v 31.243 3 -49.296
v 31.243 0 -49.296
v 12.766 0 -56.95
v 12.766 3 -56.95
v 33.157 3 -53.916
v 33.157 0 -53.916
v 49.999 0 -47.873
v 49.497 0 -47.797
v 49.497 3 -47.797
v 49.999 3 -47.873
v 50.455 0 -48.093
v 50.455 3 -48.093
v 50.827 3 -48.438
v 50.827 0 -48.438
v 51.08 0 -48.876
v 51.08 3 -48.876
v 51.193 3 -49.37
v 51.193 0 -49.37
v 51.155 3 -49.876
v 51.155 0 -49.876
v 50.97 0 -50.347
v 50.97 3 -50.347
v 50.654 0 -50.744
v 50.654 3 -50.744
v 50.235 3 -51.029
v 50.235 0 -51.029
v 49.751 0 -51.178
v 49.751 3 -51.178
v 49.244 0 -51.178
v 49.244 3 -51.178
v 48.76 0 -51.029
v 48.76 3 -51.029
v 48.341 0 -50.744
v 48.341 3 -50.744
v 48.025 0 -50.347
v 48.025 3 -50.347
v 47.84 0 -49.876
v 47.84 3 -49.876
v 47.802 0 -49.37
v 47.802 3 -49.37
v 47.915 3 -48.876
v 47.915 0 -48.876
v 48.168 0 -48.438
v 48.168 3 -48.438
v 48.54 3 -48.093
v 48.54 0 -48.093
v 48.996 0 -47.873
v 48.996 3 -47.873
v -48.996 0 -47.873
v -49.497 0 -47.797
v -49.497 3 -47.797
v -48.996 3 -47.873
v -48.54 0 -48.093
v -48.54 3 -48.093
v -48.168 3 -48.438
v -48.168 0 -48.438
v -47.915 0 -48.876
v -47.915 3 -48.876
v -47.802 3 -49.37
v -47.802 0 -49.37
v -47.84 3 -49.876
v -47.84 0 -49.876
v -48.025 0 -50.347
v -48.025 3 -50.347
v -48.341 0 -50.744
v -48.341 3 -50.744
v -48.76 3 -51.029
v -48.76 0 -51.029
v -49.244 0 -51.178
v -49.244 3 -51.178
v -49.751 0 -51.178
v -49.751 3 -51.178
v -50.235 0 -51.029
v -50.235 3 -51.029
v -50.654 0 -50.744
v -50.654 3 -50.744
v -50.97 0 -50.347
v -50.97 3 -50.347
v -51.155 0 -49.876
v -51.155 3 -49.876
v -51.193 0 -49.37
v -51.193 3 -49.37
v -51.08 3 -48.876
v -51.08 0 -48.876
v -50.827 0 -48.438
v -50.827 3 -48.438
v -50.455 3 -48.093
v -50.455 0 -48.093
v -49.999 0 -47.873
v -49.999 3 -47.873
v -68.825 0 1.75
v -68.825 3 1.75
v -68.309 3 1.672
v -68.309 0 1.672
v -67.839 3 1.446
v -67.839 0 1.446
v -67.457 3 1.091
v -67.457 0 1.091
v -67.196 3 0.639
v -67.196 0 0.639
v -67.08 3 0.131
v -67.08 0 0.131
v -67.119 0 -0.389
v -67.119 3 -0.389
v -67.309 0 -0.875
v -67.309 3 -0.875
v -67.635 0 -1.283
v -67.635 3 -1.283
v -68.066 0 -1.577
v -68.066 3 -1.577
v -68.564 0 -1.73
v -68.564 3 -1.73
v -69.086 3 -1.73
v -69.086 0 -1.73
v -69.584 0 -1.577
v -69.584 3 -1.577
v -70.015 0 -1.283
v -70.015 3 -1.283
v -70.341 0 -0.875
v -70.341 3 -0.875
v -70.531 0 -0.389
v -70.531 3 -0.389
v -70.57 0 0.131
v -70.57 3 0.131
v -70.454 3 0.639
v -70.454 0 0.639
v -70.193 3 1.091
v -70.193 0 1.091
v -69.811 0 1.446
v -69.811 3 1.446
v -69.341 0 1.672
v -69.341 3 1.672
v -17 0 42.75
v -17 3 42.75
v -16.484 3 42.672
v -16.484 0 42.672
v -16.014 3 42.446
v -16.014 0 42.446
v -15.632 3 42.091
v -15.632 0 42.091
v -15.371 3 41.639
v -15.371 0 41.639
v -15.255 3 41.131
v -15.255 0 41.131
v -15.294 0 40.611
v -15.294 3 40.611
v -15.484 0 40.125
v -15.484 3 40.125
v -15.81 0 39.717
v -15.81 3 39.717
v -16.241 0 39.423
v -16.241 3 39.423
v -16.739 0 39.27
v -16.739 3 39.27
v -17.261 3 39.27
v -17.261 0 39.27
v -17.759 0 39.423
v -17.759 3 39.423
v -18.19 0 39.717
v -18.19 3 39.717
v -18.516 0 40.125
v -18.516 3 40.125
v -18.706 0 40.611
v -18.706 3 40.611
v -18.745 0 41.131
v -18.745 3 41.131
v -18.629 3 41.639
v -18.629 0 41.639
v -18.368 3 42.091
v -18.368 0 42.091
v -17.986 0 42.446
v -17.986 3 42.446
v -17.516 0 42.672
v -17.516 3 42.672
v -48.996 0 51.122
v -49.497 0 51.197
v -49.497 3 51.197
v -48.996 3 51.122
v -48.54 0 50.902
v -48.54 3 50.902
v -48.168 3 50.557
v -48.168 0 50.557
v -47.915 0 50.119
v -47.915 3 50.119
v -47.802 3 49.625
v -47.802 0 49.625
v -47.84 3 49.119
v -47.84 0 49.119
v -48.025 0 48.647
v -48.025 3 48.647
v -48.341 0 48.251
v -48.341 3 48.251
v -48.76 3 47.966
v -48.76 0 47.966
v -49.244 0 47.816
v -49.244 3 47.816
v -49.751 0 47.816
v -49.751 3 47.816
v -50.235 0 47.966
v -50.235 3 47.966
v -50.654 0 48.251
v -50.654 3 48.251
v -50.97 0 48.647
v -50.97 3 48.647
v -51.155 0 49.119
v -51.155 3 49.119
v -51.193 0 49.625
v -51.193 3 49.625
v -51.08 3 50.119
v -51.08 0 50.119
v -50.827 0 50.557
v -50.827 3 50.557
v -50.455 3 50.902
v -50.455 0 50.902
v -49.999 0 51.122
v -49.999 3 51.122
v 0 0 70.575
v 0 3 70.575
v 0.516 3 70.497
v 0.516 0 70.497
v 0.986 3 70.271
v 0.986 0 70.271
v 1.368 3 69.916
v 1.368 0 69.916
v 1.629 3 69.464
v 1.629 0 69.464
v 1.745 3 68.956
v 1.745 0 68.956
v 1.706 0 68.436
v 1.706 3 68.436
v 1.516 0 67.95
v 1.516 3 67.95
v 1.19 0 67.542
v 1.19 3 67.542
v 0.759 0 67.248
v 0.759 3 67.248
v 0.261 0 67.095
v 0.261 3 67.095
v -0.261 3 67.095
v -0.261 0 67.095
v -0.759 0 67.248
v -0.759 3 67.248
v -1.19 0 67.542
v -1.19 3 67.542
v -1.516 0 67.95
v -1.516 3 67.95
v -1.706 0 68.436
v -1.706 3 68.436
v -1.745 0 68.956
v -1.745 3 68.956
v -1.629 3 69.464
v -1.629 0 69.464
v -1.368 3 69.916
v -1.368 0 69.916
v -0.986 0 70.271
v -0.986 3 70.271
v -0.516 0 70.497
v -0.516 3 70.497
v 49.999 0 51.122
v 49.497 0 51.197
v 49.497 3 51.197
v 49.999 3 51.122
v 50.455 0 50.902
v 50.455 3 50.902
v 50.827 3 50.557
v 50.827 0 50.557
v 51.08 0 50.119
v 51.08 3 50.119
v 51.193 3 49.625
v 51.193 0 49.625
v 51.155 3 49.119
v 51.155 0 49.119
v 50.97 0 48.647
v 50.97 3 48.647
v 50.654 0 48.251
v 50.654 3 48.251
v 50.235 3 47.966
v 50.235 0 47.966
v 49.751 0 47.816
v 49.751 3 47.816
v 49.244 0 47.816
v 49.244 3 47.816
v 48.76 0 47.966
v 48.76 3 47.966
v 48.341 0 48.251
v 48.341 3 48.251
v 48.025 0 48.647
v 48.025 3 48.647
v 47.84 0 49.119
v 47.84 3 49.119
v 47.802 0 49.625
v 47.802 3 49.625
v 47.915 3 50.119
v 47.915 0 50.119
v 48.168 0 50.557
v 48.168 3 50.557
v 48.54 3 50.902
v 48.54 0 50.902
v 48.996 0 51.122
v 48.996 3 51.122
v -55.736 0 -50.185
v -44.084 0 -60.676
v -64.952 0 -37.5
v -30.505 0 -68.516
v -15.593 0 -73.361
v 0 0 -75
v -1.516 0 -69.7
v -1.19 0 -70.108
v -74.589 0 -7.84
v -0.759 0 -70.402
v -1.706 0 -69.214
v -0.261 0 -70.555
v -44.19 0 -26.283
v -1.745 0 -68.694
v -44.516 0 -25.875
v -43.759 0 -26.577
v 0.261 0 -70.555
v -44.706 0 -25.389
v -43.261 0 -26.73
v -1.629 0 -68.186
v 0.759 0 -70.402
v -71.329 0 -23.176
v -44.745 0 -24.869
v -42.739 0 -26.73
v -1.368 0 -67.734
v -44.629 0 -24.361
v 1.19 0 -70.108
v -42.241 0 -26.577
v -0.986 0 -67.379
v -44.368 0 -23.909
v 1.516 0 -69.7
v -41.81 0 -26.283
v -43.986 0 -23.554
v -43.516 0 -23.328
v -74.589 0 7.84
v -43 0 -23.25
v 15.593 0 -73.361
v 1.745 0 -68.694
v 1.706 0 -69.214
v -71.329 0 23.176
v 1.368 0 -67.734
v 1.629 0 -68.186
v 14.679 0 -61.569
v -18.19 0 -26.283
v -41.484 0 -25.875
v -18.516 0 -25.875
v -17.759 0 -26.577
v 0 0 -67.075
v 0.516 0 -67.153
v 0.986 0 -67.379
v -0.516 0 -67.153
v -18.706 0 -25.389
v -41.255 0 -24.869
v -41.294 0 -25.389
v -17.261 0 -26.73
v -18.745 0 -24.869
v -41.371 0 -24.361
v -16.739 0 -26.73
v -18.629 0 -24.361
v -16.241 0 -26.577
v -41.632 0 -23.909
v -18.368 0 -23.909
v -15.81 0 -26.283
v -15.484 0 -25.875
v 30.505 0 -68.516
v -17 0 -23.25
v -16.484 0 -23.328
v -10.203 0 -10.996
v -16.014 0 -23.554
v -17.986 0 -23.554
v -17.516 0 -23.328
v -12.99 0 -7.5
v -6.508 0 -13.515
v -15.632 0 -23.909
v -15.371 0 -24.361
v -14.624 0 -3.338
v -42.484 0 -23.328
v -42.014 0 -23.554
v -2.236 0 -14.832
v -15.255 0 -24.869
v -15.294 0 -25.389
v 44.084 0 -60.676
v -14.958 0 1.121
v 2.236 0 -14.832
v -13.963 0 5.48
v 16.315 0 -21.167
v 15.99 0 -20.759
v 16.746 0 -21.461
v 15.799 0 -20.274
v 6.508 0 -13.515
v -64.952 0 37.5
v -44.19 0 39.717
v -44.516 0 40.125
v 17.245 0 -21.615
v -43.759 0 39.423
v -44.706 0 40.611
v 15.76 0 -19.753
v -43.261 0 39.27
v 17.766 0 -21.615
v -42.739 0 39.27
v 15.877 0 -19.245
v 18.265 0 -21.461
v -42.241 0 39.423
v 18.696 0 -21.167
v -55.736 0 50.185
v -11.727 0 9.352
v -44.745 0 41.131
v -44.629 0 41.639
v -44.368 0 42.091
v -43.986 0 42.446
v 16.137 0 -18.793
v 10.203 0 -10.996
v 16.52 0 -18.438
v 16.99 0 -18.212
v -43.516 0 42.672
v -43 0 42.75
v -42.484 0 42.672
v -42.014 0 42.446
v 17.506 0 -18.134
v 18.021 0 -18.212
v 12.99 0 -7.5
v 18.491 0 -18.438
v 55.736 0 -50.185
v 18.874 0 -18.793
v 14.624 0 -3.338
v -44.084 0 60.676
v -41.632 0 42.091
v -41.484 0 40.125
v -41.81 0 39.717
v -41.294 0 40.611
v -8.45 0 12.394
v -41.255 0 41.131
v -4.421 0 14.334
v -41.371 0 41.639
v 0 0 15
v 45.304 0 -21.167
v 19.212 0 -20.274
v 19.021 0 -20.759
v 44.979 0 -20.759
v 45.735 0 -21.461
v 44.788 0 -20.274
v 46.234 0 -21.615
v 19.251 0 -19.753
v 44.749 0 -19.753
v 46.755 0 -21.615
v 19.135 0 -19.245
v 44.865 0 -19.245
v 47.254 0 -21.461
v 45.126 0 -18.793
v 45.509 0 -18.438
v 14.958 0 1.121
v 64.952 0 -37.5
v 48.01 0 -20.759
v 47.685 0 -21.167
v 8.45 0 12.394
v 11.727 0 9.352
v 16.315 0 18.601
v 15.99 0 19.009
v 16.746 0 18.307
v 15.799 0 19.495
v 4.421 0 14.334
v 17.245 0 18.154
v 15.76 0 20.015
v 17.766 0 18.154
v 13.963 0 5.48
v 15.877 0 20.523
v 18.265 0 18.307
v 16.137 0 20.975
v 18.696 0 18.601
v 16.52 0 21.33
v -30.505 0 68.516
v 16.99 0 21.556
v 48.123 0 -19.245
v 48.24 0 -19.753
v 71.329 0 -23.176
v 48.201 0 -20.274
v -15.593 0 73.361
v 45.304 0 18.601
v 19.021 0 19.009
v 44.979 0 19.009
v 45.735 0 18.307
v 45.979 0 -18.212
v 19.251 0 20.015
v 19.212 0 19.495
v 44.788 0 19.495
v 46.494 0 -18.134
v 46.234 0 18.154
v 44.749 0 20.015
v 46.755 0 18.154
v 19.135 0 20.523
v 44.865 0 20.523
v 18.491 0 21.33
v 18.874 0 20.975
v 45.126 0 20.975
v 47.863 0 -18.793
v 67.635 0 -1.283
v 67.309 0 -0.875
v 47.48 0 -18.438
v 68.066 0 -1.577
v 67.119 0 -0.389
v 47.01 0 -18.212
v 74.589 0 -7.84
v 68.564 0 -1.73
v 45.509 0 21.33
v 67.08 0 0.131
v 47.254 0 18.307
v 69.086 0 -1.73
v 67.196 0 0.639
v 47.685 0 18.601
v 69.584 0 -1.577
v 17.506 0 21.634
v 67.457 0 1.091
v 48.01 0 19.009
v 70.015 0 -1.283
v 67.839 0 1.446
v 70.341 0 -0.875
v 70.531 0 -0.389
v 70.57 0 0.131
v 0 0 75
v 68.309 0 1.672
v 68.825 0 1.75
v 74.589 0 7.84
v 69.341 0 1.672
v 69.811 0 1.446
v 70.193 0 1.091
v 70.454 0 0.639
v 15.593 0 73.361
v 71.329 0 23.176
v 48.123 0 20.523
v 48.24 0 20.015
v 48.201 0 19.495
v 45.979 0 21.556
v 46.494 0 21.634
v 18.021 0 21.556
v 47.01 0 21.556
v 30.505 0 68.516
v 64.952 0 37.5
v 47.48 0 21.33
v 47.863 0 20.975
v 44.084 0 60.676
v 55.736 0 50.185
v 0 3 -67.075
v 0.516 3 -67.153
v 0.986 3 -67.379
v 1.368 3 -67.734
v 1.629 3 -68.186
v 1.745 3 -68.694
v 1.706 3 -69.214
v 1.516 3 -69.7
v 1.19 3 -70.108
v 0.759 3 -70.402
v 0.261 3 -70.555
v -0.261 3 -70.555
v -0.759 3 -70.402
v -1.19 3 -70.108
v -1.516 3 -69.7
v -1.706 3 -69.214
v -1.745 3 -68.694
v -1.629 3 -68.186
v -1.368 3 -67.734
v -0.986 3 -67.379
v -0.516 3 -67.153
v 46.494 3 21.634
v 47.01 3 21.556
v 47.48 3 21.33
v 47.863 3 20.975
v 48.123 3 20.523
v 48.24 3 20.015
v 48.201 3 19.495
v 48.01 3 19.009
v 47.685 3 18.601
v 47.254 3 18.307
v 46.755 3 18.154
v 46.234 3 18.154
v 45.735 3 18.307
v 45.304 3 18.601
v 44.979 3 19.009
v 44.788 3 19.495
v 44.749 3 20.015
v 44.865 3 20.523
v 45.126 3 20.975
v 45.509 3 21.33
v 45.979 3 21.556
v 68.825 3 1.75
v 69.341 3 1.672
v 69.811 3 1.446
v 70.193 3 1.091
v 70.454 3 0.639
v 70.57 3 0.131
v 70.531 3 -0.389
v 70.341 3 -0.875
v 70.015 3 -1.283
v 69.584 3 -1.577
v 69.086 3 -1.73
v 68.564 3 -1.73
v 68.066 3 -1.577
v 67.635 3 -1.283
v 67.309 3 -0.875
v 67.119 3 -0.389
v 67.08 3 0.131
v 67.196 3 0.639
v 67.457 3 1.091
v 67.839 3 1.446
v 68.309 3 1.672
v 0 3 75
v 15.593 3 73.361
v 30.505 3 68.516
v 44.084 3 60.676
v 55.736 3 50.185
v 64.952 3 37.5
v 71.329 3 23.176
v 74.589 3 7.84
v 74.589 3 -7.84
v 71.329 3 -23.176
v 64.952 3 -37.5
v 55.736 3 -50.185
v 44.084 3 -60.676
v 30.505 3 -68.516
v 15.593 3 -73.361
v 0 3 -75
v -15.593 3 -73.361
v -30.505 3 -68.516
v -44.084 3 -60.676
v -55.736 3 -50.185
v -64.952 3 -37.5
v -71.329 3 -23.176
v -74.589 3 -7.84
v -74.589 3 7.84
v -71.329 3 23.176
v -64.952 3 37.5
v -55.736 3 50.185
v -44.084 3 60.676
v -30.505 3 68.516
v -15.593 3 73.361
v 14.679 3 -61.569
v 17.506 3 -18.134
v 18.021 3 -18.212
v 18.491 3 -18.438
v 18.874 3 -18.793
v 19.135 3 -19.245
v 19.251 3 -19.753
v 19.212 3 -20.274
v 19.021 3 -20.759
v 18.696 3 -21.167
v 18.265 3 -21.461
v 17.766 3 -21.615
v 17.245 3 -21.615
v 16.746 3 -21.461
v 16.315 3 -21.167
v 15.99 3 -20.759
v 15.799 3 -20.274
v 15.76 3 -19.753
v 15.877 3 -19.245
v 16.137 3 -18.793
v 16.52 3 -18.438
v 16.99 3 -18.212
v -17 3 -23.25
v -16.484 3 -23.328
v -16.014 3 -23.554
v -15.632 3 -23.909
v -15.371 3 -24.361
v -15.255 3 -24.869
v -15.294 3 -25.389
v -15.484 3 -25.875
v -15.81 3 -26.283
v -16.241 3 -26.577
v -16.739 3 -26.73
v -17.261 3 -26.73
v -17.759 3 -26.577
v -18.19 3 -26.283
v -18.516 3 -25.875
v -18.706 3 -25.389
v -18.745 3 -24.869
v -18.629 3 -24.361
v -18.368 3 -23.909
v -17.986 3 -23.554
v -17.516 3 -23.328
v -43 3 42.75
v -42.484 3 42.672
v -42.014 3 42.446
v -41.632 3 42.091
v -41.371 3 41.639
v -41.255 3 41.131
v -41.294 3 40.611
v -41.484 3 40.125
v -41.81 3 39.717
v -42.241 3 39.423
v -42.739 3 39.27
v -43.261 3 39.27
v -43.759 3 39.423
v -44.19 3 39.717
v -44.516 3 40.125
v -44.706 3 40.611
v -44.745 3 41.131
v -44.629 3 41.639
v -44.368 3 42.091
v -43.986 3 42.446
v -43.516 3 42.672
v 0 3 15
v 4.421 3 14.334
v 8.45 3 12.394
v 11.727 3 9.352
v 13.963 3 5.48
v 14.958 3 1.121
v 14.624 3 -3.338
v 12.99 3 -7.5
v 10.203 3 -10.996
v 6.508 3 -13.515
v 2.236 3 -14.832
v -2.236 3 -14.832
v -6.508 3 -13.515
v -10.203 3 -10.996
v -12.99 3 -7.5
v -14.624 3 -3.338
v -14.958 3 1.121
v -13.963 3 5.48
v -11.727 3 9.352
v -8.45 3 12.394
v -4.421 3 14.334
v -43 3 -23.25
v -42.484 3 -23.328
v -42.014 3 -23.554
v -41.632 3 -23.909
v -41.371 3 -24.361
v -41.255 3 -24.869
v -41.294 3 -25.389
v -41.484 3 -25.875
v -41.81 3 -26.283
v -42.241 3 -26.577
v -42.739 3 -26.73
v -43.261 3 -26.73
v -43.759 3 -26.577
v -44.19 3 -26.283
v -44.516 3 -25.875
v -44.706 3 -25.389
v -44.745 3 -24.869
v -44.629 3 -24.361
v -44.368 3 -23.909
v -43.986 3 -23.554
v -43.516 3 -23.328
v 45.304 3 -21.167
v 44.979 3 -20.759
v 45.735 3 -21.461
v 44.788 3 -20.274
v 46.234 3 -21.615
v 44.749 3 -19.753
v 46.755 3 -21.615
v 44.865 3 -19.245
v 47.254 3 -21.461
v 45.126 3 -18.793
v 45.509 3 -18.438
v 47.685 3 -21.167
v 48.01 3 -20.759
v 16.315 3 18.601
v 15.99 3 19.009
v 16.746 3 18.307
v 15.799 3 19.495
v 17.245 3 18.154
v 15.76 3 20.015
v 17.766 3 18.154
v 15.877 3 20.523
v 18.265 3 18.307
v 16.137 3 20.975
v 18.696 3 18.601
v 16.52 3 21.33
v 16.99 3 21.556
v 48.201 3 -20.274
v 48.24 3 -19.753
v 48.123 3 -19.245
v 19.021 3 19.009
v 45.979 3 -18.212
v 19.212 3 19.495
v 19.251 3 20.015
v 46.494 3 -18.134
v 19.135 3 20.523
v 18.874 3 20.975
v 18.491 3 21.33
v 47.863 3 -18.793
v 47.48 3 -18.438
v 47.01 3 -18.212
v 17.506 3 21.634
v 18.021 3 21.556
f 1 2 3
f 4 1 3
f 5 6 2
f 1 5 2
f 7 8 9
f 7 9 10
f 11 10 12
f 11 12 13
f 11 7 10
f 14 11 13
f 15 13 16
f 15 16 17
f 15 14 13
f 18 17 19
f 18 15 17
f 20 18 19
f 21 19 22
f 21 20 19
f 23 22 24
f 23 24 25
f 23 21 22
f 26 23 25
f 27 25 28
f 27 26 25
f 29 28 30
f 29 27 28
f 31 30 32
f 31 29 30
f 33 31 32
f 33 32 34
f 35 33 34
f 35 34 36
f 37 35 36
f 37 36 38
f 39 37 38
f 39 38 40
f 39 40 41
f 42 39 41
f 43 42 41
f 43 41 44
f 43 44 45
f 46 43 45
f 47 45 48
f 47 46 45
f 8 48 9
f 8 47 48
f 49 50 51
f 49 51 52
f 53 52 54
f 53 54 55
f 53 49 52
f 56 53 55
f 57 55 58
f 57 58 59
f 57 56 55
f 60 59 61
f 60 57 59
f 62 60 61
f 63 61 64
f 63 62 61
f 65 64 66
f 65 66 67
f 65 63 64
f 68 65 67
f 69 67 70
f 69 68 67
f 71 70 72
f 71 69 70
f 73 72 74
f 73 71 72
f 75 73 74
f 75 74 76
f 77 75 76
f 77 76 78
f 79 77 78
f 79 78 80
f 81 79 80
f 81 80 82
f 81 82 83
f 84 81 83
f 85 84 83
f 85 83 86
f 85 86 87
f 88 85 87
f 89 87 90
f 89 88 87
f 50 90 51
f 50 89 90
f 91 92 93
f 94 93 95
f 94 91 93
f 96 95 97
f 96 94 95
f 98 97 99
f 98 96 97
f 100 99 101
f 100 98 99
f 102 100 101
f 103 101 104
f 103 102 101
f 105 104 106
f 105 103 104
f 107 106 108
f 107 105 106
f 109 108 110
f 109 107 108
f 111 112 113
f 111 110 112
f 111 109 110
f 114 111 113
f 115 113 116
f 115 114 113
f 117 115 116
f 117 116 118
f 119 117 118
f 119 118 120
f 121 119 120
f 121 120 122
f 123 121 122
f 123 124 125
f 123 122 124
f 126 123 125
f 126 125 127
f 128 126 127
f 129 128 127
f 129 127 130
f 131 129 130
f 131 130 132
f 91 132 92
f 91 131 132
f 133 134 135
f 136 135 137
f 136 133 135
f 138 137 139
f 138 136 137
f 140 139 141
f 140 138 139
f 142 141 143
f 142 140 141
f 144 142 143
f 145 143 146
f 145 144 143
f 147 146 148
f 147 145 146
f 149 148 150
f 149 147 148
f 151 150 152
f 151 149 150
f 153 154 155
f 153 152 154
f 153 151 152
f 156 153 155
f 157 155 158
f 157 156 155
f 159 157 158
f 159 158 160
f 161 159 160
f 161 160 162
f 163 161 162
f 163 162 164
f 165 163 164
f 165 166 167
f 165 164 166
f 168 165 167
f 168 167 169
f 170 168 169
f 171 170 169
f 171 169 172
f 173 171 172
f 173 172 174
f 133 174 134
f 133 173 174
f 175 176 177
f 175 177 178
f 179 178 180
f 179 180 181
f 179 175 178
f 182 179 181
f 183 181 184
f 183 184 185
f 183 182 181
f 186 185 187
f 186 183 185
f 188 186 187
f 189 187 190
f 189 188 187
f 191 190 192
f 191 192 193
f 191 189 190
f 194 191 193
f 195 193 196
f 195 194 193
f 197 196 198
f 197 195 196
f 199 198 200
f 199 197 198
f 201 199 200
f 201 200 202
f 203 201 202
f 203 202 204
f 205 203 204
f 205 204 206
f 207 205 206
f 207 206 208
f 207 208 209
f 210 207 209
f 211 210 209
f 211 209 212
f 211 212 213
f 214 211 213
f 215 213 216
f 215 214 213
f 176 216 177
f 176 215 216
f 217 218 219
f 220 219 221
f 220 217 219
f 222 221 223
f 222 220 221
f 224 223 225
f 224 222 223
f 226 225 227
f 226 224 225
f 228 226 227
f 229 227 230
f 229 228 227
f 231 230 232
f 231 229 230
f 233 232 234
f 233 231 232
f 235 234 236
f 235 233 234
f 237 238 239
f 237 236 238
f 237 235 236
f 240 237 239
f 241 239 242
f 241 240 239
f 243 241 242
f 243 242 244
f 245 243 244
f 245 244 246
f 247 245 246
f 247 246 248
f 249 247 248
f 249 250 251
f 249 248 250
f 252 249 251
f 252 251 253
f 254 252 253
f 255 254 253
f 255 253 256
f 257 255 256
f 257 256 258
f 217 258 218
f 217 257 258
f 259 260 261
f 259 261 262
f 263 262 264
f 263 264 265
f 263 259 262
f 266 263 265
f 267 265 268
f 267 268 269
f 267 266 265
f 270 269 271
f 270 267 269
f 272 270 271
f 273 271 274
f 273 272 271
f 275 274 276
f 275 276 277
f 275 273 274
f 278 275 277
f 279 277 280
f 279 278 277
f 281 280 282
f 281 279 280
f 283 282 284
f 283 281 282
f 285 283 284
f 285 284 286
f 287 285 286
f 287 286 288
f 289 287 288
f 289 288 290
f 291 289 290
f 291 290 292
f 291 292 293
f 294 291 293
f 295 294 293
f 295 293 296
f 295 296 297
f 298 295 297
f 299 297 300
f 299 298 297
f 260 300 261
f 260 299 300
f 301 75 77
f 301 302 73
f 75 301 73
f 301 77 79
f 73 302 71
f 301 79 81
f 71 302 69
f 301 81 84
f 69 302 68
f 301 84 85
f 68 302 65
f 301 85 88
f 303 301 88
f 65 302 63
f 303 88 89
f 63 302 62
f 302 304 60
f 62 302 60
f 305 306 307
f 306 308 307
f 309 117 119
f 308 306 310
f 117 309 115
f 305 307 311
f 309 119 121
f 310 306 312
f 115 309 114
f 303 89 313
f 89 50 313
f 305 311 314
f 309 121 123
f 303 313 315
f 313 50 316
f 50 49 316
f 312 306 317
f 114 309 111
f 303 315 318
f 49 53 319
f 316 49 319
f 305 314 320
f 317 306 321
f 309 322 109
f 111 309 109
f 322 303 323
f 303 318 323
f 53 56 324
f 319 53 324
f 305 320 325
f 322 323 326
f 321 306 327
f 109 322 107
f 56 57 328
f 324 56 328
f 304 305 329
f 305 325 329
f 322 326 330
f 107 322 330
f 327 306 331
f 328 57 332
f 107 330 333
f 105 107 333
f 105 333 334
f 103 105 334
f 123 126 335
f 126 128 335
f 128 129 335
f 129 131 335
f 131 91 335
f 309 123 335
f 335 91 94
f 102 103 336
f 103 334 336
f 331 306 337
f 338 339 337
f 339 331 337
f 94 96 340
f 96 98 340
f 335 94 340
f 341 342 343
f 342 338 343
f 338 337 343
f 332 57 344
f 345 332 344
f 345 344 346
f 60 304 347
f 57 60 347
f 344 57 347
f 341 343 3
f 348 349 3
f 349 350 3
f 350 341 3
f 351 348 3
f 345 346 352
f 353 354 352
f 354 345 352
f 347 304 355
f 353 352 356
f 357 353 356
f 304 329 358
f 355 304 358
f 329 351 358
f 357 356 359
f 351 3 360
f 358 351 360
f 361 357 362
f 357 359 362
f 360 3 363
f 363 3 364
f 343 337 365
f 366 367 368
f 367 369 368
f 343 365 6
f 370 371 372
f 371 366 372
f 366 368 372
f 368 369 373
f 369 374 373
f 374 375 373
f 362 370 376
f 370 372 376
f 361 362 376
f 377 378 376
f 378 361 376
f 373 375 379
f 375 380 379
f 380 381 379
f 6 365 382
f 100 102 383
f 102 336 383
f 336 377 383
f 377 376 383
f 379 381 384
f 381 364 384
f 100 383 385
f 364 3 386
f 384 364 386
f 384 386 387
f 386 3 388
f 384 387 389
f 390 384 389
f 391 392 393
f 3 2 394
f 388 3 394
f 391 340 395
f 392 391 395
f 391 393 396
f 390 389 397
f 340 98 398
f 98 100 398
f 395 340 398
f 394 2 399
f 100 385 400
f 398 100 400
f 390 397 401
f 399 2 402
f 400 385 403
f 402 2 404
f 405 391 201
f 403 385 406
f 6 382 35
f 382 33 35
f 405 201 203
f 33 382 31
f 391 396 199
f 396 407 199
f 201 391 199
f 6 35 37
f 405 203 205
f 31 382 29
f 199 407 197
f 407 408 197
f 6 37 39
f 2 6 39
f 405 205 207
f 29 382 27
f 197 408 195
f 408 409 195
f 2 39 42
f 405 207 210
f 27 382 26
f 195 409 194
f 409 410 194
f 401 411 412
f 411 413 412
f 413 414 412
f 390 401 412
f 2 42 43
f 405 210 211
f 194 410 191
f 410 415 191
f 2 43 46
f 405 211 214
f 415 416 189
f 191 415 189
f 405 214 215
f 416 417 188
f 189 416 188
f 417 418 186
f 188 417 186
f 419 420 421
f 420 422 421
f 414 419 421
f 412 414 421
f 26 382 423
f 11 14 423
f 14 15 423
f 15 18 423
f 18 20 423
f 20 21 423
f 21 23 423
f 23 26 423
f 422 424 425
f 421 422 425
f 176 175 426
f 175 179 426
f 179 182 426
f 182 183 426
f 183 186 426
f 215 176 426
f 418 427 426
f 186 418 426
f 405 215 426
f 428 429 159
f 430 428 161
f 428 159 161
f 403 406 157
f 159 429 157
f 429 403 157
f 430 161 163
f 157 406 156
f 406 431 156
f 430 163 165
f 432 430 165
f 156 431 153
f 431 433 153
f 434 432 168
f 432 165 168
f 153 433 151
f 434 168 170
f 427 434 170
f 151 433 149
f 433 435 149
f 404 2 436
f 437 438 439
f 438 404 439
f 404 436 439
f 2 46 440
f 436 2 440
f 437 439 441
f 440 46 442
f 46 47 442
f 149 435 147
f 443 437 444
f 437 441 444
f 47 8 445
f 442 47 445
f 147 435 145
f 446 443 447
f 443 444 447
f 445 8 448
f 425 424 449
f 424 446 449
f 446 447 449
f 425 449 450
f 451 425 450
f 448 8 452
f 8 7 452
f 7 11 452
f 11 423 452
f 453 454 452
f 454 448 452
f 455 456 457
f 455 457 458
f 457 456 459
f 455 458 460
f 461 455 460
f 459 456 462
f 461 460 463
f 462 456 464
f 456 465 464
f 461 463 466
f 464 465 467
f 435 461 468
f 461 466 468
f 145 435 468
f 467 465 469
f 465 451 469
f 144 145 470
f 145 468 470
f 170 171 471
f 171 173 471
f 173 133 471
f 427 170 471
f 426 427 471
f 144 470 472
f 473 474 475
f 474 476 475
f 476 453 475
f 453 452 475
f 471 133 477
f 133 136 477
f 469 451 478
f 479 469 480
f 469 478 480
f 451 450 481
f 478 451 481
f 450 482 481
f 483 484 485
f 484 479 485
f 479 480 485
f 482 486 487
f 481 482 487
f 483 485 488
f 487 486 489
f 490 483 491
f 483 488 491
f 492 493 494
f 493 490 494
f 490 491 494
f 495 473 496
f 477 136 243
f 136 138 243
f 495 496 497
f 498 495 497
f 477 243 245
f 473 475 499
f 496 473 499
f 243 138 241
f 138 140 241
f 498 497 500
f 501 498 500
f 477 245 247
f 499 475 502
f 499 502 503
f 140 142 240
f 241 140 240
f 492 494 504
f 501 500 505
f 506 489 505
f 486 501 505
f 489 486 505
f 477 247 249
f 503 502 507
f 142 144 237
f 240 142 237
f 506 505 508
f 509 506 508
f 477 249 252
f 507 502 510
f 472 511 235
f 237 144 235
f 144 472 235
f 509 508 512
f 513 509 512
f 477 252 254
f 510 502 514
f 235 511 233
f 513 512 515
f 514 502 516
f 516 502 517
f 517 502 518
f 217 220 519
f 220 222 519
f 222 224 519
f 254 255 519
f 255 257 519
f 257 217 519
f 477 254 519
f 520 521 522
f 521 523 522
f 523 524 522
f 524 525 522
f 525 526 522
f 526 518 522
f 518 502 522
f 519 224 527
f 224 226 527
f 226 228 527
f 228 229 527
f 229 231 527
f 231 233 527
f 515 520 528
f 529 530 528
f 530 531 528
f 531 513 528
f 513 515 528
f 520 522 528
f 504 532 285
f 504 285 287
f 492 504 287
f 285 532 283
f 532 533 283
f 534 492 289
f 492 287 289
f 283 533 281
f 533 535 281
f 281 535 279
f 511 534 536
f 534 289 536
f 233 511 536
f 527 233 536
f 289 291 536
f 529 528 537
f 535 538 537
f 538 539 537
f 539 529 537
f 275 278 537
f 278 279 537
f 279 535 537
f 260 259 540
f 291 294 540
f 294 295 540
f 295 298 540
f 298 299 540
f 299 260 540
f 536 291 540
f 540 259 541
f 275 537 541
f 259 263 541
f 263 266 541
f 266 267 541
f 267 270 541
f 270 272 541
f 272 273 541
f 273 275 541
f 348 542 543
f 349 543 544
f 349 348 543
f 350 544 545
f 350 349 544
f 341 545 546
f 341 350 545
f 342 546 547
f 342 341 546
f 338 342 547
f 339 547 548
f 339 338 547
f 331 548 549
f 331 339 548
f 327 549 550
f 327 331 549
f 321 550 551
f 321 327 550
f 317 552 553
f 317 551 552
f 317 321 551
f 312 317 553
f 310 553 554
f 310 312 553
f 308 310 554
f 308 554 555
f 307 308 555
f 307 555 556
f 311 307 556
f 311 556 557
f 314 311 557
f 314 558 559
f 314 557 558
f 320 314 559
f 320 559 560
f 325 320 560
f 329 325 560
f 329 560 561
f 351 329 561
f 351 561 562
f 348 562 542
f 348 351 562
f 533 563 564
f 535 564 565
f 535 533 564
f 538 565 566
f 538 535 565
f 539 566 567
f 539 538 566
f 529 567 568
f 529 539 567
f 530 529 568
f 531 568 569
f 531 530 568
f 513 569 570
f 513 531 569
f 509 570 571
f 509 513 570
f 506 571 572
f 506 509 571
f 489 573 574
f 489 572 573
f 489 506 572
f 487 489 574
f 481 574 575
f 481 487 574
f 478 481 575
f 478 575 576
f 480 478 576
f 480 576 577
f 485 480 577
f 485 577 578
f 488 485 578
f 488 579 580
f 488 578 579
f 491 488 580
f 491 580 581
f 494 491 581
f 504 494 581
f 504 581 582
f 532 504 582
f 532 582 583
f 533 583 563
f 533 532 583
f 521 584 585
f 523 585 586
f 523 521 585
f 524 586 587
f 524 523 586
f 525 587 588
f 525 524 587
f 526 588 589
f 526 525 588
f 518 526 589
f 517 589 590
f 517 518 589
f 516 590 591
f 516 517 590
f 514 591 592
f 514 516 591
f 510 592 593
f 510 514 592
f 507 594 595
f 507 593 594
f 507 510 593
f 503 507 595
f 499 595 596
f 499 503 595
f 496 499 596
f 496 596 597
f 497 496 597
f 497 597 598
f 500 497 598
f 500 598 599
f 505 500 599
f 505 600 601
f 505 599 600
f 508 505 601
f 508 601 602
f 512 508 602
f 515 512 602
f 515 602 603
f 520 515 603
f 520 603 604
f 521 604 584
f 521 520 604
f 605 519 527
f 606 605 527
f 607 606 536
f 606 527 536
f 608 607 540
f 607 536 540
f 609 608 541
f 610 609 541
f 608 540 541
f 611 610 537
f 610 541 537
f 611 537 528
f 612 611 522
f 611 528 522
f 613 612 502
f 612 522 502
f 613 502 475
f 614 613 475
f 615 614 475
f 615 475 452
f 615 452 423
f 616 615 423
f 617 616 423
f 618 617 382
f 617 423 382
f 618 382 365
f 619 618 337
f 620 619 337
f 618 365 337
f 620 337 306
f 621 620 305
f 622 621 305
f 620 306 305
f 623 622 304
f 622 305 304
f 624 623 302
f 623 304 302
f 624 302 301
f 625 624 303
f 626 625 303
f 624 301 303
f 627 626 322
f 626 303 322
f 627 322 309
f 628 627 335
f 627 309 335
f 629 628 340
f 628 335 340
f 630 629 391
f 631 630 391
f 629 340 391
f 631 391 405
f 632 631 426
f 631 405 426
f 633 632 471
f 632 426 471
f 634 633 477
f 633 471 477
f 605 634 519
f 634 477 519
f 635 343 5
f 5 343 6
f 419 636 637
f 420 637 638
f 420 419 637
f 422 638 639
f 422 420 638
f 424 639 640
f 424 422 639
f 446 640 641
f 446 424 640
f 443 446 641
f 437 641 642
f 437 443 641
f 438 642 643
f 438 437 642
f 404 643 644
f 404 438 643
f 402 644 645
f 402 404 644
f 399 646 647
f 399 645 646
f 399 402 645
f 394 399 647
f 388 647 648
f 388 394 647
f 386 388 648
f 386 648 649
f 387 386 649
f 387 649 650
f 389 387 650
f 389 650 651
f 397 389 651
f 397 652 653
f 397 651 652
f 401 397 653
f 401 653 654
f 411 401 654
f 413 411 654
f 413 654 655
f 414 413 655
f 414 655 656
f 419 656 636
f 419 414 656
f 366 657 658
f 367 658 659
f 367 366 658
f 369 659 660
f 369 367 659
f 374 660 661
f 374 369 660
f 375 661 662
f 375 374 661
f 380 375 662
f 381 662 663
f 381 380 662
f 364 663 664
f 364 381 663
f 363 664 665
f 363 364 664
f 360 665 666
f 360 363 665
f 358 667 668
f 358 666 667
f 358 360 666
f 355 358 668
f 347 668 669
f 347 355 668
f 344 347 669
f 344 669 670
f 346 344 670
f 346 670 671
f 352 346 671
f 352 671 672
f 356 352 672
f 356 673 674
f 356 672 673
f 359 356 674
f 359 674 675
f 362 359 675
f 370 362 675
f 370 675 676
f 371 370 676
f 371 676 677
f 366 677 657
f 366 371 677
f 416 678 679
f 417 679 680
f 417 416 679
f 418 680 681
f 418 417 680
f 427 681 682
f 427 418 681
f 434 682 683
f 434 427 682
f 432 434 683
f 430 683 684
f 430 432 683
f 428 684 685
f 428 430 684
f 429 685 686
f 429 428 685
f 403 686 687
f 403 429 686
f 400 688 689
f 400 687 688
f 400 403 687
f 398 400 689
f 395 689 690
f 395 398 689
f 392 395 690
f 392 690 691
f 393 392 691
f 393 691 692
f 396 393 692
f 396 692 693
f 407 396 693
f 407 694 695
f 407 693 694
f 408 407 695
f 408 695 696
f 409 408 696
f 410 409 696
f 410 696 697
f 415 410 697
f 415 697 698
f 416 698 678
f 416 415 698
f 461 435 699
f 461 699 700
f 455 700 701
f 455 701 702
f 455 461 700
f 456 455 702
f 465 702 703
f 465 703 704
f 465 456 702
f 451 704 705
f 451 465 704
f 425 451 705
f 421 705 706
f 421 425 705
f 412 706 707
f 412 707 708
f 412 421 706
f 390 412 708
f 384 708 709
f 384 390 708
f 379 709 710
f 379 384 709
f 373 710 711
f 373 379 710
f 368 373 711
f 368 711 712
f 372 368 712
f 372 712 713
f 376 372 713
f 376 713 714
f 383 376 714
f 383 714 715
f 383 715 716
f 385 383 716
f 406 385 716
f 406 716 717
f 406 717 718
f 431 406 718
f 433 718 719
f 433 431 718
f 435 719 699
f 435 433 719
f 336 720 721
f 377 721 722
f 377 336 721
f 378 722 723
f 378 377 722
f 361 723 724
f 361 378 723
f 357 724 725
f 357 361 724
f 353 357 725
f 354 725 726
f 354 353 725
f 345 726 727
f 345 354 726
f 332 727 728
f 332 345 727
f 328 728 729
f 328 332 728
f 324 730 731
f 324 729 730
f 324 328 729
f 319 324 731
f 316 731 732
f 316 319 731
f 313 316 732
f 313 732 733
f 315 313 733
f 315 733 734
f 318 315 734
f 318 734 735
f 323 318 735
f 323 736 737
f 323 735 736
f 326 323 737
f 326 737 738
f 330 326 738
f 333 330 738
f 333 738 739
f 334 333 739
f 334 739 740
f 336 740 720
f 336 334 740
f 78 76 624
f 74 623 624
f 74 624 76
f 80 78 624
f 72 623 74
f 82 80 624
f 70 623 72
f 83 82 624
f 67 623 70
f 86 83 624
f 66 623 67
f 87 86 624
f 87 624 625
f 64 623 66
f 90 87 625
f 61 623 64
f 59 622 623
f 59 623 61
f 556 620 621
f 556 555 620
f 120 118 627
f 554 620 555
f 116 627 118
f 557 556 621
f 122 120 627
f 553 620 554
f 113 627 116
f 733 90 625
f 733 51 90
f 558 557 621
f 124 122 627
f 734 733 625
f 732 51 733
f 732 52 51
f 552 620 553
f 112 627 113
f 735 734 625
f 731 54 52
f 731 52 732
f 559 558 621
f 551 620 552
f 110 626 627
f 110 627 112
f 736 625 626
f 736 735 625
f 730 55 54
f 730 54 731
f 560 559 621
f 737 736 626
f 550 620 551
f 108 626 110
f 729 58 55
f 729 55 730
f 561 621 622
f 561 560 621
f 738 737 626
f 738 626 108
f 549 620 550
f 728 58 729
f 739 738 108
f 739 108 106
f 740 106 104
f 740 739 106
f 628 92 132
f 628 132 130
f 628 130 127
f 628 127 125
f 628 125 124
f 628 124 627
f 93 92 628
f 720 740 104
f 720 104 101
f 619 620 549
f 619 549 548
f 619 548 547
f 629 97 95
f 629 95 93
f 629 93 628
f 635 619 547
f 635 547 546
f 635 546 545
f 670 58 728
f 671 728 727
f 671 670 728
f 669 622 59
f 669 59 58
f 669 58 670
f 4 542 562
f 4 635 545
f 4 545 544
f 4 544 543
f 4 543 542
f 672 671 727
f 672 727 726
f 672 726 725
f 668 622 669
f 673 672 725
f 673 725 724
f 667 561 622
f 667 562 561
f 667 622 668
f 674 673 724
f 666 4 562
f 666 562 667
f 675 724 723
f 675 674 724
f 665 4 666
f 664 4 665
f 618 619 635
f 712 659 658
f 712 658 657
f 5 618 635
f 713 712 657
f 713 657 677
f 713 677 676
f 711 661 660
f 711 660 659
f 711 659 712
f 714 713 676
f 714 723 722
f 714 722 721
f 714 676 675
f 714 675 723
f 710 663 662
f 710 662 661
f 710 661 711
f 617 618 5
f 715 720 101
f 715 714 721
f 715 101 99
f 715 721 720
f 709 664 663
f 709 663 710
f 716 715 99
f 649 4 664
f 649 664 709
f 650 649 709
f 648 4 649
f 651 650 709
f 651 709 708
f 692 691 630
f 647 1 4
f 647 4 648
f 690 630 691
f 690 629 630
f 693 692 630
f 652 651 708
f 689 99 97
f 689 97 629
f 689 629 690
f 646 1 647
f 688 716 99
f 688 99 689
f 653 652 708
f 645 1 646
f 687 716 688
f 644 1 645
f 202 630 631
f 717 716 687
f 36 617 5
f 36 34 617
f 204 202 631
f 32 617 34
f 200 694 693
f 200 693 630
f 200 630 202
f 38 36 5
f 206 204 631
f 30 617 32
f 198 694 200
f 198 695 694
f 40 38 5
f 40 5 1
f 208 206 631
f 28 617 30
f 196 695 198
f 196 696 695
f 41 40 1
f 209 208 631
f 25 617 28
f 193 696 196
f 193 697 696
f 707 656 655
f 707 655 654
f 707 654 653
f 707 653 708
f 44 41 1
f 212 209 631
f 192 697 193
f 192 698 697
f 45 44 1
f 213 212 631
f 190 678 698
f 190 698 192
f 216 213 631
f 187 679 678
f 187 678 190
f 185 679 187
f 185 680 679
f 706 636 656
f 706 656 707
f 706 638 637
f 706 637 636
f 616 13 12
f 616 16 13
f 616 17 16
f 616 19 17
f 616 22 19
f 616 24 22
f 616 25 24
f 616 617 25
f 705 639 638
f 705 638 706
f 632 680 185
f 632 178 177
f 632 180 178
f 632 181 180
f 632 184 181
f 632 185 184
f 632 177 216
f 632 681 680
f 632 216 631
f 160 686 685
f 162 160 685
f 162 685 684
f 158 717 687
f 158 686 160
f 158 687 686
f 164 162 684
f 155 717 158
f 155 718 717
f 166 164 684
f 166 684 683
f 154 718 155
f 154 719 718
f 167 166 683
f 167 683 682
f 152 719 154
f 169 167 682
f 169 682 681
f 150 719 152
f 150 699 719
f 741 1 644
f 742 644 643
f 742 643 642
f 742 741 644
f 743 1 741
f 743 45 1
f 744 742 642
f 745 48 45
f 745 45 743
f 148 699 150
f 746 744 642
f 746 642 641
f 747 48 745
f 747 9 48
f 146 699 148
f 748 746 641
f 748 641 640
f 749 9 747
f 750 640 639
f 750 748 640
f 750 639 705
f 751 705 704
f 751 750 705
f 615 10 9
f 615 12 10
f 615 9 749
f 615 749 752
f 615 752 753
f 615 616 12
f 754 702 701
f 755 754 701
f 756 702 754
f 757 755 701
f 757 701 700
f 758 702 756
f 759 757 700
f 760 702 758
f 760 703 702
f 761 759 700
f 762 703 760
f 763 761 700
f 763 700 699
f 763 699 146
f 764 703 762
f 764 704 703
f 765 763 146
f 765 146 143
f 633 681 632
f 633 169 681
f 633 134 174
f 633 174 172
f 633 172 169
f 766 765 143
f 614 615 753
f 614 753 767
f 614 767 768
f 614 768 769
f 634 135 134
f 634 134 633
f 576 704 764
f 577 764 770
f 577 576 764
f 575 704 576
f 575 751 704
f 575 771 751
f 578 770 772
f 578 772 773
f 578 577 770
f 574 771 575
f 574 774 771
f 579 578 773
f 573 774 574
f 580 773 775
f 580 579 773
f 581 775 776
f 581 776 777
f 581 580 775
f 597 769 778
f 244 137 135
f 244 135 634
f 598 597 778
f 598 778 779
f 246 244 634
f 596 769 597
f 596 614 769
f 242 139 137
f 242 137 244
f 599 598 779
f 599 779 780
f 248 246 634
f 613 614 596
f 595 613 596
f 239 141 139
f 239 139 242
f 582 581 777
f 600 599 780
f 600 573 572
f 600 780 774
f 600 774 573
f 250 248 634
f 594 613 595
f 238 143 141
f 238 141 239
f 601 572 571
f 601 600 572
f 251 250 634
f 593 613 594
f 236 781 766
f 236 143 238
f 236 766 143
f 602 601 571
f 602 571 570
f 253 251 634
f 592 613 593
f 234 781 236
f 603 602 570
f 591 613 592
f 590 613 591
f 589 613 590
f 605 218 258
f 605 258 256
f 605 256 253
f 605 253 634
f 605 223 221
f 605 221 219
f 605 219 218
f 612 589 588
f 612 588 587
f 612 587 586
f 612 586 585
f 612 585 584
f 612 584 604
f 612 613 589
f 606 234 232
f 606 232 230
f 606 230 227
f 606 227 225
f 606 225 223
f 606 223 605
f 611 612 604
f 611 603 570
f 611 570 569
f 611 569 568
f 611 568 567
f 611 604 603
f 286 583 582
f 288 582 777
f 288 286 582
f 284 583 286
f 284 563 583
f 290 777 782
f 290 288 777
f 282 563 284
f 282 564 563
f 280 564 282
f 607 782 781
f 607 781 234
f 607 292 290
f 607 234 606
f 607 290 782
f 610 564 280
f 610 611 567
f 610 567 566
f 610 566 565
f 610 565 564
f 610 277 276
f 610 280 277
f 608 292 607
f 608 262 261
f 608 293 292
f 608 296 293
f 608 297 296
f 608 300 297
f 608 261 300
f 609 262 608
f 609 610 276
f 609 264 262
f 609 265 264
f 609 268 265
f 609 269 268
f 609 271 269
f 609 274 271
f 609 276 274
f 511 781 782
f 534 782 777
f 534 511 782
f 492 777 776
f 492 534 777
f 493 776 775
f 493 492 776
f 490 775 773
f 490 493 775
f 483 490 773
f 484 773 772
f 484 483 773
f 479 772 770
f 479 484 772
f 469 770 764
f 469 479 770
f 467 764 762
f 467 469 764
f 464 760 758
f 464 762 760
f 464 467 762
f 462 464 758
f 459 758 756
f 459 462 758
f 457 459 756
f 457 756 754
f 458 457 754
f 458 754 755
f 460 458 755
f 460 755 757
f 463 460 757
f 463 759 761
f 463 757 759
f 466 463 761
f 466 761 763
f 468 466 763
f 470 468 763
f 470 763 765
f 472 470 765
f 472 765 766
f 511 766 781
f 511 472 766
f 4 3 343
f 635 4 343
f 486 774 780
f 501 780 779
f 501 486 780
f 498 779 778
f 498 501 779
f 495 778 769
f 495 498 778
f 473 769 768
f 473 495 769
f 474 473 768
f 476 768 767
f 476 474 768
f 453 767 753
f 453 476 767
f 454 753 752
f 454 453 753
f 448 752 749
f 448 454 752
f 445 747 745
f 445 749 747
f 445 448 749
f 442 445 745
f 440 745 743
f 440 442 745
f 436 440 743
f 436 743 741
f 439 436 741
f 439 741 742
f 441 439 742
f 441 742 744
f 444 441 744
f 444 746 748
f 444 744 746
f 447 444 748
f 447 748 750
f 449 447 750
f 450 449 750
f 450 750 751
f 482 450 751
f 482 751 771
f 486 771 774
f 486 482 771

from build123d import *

# Parameters (mm, degrees)
SKETCH1_R           = 75
SKETCH1_R_2         = 1.7
SKETCH1_R_3         = 15
BOSS_EXTRUDE1_DEPTH = 3
SKETCH2_R           = 1.75
CUT_EXTRUDE2_DEPTH  = 107.108435103
SKETCH3_R           = 1.75
CUT_EXTRUDE3_DEPTH  = 107.108435103


with BuildPart() as part:
    # Sketch1 → Boss-Extrude1 (new body)
    with BuildSketch(Plane(origin=(0, 0, 0), x_dir=(1, 0, 0), z_dir=(0, 1, 0))):
        with Locations(Location((0, 0, 0), (0, 0, 270))):
            Circle(SKETCH1_R)
        with Locations(Location((49.497474683, 49.497474683, 0), (0, 0, 270))):
            Circle(SKETCH1_R_2, mode=Mode.SUBTRACT)
        with Locations(Location((-49.497474683, 49.497474683, 0), (0, 0, 270))):
            Circle(SKETCH1_R_2, mode=Mode.SUBTRACT)
        with Locations(Location((-49.497474683, -49.497474683, 0), (0, 0, 270))):
            Circle(SKETCH1_R_2, mode=Mode.SUBTRACT)
        with Locations(Location((49.497474683, -49.497474683, 0), (0, 0, 270))):
            Circle(SKETCH1_R_2, mode=Mode.SUBTRACT)
        with Locations(Location((0, 0, 0), (0, 0, 270))):
            Circle(SKETCH1_R_3, mode=Mode.SUBTRACT)
    extrude(amount=BOSS_EXTRUDE1_DEPTH)

    # Sketch2 → Cut-Extrude2 (cut, through all)
    with BuildSketch(Plane(origin=(0, 0, 0), x_dir=(1, 0, 0), z_dir=(0, 1, 0))):
        with Locations(Location((0, 68.825, 0), (0, 0, 270))):
            Circle(SKETCH2_R)
        with Locations(Location((68.825, 0, 0), (0, 0, 270))):
            Circle(SKETCH2_R)
        with Locations(Location((0, -68.825, 0), (0, 0, 270))):
            Circle(SKETCH2_R)
        with Locations(Location((-68.825, 0, 0), (0, 0, 270))):
            Circle(SKETCH2_R)
    extrude(amount=CUT_EXTRUDE2_DEPTH, mode=Mode.SUBTRACT)

    # Sketch3 → Cut-Extrude3 (cut, through all)
    with BuildSketch(Plane(origin=(0, 0, 0), x_dir=(1, 0, 0), z_dir=(0, 1, 0))):
        with Locations(Location((-43, 25, 0), (0, 0, 270))):
            Circle(SKETCH3_R)
        with Locations(Location((-17, 25, 0), (0, 0, 270))):
            Circle(SKETCH3_R)
        with Locations(Location((-17, -41, 0), (0, 0, 270))):
            Circle(SKETCH3_R)
        with Locations(Location((-43, -41, 0), (0, 0, 270))):
            Circle(SKETCH3_R)
        with Locations(Location((17.505557347, 19.884131141, 0), (0, 0, 270))):
            Circle(SKETCH3_R)
        with Locations(Location((46.494442653, -19.884131141, 0), (0, 0, 270))):
            Circle(SKETCH3_R)
        with Locations(Location((46.494442653, 19.884131141, 0), (0, 0, 270))):
            Circle(SKETCH3_R)
        with Locations(Location((17.505557347, -19.884131141, 0), (0, 0, 270))):
            Circle(SKETCH3_R)
        Polygon((31.243092686, 49.296238796), (12.765502036, 56.949907443), (14.678919198, 61.569305106), (33.156509848, 53.915636458), align=None)
    extrude(amount=CUT_EXTRUDE3_DEPTH, mode=Mode.SUBTRACT)


solid = part.part
